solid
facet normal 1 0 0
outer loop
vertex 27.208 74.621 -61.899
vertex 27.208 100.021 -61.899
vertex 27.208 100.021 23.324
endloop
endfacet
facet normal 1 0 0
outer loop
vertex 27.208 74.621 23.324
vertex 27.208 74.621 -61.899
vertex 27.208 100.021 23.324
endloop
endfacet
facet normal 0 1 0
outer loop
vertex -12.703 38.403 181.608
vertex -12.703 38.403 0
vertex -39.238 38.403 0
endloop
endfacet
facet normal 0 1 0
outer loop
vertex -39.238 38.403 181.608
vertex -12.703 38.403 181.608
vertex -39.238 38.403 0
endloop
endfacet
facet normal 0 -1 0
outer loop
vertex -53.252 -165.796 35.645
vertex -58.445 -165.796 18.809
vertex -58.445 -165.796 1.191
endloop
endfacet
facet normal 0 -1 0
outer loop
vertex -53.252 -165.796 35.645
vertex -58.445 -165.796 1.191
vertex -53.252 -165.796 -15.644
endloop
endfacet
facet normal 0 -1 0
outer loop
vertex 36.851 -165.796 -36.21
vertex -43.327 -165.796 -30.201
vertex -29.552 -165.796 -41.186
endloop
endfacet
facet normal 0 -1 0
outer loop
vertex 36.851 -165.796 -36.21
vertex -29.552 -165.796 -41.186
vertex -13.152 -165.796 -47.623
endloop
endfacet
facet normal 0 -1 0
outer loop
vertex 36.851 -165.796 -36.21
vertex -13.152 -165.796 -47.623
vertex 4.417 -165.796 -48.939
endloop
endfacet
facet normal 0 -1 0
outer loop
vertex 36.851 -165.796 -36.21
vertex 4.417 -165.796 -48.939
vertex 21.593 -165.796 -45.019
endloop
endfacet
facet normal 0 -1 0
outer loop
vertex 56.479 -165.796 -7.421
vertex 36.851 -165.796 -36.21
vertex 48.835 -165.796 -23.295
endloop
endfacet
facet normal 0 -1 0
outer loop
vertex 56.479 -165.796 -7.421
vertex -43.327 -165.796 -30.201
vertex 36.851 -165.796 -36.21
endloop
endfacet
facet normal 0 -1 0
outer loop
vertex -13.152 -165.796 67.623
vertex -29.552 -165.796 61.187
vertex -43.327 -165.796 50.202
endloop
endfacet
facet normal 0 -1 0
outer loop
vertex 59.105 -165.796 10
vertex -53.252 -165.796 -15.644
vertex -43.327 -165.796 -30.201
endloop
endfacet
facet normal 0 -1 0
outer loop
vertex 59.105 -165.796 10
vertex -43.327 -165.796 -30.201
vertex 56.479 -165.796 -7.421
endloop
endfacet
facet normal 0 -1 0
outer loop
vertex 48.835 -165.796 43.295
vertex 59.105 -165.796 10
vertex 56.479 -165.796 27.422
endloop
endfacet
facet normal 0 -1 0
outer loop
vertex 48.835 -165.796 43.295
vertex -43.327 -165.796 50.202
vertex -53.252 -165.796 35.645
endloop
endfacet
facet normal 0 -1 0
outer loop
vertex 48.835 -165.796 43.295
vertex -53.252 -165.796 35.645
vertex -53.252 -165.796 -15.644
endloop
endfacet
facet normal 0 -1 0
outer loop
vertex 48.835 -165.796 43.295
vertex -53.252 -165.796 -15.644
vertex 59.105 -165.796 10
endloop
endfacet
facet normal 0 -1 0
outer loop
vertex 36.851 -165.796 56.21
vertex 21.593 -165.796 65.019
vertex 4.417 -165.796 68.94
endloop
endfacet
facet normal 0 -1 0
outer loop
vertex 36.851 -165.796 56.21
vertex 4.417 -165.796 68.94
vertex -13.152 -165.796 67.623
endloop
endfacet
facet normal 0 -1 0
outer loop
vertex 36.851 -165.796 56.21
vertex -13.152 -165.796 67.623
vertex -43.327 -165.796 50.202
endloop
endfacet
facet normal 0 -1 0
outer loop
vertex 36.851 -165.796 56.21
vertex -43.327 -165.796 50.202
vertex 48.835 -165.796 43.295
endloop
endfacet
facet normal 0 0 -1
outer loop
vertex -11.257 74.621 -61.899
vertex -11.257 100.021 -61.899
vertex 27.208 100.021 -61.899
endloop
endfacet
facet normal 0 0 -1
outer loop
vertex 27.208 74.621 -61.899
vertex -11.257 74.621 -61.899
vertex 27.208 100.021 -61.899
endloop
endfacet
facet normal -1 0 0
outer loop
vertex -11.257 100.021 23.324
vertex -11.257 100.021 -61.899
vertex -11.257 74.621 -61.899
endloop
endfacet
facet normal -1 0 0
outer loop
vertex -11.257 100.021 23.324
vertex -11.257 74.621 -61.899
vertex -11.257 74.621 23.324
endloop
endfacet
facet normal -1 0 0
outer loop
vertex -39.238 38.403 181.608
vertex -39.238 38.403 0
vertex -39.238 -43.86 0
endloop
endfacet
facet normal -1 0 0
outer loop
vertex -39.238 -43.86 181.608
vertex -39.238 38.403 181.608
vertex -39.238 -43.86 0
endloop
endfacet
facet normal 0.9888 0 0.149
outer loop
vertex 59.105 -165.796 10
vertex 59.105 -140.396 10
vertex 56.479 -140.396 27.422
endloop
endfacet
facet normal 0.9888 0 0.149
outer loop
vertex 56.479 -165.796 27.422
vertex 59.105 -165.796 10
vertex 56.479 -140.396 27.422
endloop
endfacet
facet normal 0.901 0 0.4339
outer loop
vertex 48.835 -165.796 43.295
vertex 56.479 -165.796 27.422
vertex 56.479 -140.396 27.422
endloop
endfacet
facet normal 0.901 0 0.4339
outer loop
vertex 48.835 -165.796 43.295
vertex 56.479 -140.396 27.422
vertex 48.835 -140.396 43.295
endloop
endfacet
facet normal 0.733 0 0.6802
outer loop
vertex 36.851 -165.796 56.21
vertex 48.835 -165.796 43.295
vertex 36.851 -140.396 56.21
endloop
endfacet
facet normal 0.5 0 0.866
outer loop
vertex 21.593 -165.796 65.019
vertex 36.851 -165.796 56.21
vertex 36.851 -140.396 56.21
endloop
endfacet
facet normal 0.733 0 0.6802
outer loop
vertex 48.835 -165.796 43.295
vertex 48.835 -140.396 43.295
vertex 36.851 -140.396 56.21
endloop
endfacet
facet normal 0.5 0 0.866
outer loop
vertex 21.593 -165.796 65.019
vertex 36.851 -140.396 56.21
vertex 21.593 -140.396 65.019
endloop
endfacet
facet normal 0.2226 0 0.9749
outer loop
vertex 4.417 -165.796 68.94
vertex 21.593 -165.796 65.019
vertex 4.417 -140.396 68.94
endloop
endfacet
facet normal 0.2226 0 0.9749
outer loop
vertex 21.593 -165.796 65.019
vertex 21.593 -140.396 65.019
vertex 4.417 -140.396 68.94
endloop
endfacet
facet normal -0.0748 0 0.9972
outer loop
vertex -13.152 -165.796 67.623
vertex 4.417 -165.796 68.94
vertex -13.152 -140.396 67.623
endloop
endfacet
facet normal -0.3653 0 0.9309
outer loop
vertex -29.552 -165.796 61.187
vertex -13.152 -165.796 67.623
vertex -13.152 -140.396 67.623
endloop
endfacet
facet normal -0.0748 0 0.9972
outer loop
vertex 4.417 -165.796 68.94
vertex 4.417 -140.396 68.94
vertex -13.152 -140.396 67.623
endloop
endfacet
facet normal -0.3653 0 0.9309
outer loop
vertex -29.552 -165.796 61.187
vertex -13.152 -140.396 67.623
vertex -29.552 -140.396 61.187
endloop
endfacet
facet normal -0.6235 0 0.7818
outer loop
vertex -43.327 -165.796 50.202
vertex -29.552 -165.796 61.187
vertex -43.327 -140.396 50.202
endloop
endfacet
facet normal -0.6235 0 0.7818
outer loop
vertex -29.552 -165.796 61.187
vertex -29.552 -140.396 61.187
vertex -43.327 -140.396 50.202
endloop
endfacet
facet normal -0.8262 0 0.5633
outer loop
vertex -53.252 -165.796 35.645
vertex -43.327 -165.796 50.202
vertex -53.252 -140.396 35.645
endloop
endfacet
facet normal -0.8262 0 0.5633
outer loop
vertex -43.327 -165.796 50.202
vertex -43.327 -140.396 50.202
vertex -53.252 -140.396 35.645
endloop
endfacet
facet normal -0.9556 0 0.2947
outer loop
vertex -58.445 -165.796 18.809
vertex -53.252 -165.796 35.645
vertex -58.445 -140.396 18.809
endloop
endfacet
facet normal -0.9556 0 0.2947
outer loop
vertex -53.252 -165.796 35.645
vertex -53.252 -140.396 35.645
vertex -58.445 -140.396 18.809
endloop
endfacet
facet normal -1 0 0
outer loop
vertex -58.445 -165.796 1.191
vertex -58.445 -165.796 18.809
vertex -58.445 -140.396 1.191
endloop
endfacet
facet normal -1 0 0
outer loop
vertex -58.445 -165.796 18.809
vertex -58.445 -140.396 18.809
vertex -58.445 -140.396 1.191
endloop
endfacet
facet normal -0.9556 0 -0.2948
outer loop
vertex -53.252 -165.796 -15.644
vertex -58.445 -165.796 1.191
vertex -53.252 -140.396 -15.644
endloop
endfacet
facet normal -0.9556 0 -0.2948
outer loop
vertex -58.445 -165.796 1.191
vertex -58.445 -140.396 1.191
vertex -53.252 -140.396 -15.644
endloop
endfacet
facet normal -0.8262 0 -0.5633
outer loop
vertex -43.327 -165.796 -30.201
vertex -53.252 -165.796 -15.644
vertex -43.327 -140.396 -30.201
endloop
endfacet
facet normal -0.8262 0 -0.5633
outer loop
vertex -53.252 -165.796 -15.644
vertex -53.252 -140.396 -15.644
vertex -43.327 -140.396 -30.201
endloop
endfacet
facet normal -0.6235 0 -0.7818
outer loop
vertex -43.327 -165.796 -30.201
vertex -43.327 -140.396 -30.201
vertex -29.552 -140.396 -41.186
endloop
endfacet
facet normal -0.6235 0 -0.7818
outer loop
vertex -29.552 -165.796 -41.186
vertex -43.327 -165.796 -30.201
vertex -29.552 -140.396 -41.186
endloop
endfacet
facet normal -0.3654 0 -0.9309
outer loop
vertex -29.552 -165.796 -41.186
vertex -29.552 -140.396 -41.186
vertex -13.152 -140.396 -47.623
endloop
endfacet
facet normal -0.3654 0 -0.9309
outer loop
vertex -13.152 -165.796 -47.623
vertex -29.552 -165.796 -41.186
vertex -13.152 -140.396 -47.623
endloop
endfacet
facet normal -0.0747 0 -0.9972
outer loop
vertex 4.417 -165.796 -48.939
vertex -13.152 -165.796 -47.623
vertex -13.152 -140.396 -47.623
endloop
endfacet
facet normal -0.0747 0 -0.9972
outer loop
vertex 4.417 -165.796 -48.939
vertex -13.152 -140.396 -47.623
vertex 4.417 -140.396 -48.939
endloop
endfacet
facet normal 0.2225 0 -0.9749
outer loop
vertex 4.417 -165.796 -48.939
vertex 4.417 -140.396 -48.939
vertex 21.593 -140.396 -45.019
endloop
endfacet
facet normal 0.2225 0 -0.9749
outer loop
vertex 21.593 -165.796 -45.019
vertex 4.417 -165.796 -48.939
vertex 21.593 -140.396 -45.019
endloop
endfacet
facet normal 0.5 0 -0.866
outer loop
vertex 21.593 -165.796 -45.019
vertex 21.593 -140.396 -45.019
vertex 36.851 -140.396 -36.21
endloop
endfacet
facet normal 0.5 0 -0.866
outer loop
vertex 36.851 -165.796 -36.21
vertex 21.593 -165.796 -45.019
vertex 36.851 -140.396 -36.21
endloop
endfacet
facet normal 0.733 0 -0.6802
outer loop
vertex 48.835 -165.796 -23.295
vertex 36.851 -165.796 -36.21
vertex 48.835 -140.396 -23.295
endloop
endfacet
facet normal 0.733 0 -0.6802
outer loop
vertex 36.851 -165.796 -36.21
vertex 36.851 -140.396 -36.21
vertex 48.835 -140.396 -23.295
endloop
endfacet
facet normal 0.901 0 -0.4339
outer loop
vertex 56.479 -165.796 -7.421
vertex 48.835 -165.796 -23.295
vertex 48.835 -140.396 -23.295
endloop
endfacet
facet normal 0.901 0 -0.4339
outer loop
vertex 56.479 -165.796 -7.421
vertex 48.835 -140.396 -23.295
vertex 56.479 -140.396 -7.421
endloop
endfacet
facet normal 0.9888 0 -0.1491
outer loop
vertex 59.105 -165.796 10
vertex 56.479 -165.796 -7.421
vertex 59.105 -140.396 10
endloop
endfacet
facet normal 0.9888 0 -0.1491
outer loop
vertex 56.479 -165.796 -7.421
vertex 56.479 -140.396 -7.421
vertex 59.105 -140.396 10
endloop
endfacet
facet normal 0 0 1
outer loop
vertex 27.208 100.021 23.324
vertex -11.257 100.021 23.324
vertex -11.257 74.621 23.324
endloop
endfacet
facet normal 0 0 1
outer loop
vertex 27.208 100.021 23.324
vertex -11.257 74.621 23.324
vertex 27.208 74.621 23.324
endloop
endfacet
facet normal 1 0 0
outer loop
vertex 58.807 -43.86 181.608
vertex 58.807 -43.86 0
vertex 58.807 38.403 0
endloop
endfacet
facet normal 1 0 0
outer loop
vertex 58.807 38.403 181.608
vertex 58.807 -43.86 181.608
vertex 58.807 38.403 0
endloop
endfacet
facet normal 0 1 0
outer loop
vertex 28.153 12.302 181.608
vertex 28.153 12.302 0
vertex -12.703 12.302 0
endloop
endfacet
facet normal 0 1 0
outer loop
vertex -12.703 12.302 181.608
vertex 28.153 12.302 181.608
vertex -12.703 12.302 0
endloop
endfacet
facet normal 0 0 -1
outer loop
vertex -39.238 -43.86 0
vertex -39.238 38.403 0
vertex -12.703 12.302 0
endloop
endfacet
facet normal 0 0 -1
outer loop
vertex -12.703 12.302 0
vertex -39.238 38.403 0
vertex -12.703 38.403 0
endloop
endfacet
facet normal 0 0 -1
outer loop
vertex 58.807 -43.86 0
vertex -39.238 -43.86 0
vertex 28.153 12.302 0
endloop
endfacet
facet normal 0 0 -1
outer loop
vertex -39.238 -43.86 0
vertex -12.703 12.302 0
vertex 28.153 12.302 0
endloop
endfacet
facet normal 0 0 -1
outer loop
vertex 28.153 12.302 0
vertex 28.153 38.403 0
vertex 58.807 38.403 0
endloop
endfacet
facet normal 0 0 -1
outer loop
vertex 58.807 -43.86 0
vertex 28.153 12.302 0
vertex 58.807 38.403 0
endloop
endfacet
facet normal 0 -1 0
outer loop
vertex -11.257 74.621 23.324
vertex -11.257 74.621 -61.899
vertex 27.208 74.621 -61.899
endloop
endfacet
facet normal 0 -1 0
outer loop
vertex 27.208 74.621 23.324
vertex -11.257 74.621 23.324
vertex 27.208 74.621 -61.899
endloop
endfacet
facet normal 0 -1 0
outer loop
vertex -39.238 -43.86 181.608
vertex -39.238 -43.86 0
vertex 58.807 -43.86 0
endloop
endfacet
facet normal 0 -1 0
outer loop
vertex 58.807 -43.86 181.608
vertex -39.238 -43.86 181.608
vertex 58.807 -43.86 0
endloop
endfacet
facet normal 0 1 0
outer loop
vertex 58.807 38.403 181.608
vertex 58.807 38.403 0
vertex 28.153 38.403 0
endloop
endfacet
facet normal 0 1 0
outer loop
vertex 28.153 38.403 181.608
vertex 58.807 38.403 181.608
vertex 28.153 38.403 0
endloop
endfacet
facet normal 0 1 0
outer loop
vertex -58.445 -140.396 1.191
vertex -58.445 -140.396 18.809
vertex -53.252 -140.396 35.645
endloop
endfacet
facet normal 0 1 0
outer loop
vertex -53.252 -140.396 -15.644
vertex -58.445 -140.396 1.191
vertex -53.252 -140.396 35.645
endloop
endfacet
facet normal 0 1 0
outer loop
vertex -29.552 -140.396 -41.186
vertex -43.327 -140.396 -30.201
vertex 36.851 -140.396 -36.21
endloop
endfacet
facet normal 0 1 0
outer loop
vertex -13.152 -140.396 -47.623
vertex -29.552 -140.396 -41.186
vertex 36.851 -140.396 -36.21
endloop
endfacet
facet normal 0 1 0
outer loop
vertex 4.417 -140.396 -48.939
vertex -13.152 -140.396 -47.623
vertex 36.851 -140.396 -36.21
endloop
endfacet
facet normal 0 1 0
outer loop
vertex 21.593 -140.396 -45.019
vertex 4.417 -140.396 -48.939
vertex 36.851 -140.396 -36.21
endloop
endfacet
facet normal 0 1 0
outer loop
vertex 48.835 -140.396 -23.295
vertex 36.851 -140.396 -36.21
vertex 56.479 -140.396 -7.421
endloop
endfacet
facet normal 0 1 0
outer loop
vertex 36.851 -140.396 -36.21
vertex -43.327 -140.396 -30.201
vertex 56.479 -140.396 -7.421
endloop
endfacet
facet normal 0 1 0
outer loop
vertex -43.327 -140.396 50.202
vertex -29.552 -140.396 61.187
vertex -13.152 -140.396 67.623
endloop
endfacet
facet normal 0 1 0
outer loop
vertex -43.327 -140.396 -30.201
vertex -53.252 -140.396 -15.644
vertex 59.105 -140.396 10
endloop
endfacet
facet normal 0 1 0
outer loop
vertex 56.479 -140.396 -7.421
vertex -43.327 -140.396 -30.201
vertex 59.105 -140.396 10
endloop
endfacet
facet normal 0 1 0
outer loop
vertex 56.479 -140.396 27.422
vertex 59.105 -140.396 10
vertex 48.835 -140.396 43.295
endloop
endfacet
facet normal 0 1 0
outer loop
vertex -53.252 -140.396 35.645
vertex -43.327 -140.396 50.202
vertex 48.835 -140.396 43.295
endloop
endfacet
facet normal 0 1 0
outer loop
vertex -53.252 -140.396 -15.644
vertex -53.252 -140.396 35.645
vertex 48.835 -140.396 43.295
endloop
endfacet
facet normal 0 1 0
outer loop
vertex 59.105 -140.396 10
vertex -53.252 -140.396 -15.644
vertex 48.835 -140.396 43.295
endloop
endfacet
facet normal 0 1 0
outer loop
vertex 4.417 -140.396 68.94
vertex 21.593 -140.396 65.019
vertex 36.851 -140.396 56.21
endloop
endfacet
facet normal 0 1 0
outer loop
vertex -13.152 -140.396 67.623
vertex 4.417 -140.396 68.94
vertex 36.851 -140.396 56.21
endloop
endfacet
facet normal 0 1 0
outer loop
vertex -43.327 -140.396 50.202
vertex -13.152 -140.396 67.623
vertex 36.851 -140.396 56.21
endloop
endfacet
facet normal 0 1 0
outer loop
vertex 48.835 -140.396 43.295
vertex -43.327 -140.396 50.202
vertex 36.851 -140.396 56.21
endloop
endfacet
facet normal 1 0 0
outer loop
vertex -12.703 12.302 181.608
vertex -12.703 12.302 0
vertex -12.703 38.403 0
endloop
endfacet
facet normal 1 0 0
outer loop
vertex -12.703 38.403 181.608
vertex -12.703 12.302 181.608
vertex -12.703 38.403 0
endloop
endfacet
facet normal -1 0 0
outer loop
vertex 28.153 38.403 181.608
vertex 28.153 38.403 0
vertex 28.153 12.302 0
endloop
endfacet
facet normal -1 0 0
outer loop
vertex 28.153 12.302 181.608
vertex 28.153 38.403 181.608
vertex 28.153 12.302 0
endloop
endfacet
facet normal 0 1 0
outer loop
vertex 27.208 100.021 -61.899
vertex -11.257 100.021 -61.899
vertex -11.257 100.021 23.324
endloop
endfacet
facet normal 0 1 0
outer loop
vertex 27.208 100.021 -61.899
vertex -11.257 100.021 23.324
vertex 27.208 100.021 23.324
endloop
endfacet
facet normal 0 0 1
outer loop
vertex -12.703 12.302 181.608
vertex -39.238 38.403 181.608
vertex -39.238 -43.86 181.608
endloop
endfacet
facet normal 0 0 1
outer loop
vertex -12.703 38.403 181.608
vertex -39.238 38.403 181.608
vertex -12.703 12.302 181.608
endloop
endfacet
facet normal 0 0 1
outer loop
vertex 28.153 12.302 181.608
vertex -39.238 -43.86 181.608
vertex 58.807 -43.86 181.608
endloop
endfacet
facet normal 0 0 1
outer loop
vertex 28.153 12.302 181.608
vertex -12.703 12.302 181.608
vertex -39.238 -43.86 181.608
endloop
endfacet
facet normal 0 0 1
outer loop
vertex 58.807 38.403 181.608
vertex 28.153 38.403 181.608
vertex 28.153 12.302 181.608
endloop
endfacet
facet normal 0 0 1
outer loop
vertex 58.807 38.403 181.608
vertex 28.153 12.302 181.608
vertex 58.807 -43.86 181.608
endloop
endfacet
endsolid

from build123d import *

# Parameters (mm, degrees)
F1_DEPTH = 181.607502
F3_W     = 38.464784
F3_H     = 85.2229
F4_DEPTH = 25.4
F6_R     = 59.104875
F7_DEPTH = 25.4


with BuildPart() as f1:
    # F0 (on Top) → F1 (new body)
    with BuildSketch(Plane.XY):
        Polygon((-12.703069, 38.402505), (-39.238244, 38.402505), (-39.238244, -43.860435), (58.807462, -43.860435), (58.807462, 38.402505), (28.152674, 38.402505), (28.152674, 12.301743), (-12.703069, 12.301743), align=None)
    extrude(amount=F1_DEPTH)


with BuildPart() as f4:
    # F3 (on offset) → F4 (new body)
    with BuildSketch(Plane.XZ.offset(-100.021111)):
        with Locations((7.975608, -19.287422)):
            Rectangle(F3_W, F3_H)
    extrude(amount=F4_DEPTH)


with BuildPart() as f7:
    # F6 (on offset) → F7 (new body)
    with BuildSketch(Plane.XZ.offset(140.396399)):
        with Locations((0, 10.000259)):
            Circle(F6_R)
    extrude(amount=F7_DEPTH)


solid = Compound([f1.part, f4.part, f7.part])
